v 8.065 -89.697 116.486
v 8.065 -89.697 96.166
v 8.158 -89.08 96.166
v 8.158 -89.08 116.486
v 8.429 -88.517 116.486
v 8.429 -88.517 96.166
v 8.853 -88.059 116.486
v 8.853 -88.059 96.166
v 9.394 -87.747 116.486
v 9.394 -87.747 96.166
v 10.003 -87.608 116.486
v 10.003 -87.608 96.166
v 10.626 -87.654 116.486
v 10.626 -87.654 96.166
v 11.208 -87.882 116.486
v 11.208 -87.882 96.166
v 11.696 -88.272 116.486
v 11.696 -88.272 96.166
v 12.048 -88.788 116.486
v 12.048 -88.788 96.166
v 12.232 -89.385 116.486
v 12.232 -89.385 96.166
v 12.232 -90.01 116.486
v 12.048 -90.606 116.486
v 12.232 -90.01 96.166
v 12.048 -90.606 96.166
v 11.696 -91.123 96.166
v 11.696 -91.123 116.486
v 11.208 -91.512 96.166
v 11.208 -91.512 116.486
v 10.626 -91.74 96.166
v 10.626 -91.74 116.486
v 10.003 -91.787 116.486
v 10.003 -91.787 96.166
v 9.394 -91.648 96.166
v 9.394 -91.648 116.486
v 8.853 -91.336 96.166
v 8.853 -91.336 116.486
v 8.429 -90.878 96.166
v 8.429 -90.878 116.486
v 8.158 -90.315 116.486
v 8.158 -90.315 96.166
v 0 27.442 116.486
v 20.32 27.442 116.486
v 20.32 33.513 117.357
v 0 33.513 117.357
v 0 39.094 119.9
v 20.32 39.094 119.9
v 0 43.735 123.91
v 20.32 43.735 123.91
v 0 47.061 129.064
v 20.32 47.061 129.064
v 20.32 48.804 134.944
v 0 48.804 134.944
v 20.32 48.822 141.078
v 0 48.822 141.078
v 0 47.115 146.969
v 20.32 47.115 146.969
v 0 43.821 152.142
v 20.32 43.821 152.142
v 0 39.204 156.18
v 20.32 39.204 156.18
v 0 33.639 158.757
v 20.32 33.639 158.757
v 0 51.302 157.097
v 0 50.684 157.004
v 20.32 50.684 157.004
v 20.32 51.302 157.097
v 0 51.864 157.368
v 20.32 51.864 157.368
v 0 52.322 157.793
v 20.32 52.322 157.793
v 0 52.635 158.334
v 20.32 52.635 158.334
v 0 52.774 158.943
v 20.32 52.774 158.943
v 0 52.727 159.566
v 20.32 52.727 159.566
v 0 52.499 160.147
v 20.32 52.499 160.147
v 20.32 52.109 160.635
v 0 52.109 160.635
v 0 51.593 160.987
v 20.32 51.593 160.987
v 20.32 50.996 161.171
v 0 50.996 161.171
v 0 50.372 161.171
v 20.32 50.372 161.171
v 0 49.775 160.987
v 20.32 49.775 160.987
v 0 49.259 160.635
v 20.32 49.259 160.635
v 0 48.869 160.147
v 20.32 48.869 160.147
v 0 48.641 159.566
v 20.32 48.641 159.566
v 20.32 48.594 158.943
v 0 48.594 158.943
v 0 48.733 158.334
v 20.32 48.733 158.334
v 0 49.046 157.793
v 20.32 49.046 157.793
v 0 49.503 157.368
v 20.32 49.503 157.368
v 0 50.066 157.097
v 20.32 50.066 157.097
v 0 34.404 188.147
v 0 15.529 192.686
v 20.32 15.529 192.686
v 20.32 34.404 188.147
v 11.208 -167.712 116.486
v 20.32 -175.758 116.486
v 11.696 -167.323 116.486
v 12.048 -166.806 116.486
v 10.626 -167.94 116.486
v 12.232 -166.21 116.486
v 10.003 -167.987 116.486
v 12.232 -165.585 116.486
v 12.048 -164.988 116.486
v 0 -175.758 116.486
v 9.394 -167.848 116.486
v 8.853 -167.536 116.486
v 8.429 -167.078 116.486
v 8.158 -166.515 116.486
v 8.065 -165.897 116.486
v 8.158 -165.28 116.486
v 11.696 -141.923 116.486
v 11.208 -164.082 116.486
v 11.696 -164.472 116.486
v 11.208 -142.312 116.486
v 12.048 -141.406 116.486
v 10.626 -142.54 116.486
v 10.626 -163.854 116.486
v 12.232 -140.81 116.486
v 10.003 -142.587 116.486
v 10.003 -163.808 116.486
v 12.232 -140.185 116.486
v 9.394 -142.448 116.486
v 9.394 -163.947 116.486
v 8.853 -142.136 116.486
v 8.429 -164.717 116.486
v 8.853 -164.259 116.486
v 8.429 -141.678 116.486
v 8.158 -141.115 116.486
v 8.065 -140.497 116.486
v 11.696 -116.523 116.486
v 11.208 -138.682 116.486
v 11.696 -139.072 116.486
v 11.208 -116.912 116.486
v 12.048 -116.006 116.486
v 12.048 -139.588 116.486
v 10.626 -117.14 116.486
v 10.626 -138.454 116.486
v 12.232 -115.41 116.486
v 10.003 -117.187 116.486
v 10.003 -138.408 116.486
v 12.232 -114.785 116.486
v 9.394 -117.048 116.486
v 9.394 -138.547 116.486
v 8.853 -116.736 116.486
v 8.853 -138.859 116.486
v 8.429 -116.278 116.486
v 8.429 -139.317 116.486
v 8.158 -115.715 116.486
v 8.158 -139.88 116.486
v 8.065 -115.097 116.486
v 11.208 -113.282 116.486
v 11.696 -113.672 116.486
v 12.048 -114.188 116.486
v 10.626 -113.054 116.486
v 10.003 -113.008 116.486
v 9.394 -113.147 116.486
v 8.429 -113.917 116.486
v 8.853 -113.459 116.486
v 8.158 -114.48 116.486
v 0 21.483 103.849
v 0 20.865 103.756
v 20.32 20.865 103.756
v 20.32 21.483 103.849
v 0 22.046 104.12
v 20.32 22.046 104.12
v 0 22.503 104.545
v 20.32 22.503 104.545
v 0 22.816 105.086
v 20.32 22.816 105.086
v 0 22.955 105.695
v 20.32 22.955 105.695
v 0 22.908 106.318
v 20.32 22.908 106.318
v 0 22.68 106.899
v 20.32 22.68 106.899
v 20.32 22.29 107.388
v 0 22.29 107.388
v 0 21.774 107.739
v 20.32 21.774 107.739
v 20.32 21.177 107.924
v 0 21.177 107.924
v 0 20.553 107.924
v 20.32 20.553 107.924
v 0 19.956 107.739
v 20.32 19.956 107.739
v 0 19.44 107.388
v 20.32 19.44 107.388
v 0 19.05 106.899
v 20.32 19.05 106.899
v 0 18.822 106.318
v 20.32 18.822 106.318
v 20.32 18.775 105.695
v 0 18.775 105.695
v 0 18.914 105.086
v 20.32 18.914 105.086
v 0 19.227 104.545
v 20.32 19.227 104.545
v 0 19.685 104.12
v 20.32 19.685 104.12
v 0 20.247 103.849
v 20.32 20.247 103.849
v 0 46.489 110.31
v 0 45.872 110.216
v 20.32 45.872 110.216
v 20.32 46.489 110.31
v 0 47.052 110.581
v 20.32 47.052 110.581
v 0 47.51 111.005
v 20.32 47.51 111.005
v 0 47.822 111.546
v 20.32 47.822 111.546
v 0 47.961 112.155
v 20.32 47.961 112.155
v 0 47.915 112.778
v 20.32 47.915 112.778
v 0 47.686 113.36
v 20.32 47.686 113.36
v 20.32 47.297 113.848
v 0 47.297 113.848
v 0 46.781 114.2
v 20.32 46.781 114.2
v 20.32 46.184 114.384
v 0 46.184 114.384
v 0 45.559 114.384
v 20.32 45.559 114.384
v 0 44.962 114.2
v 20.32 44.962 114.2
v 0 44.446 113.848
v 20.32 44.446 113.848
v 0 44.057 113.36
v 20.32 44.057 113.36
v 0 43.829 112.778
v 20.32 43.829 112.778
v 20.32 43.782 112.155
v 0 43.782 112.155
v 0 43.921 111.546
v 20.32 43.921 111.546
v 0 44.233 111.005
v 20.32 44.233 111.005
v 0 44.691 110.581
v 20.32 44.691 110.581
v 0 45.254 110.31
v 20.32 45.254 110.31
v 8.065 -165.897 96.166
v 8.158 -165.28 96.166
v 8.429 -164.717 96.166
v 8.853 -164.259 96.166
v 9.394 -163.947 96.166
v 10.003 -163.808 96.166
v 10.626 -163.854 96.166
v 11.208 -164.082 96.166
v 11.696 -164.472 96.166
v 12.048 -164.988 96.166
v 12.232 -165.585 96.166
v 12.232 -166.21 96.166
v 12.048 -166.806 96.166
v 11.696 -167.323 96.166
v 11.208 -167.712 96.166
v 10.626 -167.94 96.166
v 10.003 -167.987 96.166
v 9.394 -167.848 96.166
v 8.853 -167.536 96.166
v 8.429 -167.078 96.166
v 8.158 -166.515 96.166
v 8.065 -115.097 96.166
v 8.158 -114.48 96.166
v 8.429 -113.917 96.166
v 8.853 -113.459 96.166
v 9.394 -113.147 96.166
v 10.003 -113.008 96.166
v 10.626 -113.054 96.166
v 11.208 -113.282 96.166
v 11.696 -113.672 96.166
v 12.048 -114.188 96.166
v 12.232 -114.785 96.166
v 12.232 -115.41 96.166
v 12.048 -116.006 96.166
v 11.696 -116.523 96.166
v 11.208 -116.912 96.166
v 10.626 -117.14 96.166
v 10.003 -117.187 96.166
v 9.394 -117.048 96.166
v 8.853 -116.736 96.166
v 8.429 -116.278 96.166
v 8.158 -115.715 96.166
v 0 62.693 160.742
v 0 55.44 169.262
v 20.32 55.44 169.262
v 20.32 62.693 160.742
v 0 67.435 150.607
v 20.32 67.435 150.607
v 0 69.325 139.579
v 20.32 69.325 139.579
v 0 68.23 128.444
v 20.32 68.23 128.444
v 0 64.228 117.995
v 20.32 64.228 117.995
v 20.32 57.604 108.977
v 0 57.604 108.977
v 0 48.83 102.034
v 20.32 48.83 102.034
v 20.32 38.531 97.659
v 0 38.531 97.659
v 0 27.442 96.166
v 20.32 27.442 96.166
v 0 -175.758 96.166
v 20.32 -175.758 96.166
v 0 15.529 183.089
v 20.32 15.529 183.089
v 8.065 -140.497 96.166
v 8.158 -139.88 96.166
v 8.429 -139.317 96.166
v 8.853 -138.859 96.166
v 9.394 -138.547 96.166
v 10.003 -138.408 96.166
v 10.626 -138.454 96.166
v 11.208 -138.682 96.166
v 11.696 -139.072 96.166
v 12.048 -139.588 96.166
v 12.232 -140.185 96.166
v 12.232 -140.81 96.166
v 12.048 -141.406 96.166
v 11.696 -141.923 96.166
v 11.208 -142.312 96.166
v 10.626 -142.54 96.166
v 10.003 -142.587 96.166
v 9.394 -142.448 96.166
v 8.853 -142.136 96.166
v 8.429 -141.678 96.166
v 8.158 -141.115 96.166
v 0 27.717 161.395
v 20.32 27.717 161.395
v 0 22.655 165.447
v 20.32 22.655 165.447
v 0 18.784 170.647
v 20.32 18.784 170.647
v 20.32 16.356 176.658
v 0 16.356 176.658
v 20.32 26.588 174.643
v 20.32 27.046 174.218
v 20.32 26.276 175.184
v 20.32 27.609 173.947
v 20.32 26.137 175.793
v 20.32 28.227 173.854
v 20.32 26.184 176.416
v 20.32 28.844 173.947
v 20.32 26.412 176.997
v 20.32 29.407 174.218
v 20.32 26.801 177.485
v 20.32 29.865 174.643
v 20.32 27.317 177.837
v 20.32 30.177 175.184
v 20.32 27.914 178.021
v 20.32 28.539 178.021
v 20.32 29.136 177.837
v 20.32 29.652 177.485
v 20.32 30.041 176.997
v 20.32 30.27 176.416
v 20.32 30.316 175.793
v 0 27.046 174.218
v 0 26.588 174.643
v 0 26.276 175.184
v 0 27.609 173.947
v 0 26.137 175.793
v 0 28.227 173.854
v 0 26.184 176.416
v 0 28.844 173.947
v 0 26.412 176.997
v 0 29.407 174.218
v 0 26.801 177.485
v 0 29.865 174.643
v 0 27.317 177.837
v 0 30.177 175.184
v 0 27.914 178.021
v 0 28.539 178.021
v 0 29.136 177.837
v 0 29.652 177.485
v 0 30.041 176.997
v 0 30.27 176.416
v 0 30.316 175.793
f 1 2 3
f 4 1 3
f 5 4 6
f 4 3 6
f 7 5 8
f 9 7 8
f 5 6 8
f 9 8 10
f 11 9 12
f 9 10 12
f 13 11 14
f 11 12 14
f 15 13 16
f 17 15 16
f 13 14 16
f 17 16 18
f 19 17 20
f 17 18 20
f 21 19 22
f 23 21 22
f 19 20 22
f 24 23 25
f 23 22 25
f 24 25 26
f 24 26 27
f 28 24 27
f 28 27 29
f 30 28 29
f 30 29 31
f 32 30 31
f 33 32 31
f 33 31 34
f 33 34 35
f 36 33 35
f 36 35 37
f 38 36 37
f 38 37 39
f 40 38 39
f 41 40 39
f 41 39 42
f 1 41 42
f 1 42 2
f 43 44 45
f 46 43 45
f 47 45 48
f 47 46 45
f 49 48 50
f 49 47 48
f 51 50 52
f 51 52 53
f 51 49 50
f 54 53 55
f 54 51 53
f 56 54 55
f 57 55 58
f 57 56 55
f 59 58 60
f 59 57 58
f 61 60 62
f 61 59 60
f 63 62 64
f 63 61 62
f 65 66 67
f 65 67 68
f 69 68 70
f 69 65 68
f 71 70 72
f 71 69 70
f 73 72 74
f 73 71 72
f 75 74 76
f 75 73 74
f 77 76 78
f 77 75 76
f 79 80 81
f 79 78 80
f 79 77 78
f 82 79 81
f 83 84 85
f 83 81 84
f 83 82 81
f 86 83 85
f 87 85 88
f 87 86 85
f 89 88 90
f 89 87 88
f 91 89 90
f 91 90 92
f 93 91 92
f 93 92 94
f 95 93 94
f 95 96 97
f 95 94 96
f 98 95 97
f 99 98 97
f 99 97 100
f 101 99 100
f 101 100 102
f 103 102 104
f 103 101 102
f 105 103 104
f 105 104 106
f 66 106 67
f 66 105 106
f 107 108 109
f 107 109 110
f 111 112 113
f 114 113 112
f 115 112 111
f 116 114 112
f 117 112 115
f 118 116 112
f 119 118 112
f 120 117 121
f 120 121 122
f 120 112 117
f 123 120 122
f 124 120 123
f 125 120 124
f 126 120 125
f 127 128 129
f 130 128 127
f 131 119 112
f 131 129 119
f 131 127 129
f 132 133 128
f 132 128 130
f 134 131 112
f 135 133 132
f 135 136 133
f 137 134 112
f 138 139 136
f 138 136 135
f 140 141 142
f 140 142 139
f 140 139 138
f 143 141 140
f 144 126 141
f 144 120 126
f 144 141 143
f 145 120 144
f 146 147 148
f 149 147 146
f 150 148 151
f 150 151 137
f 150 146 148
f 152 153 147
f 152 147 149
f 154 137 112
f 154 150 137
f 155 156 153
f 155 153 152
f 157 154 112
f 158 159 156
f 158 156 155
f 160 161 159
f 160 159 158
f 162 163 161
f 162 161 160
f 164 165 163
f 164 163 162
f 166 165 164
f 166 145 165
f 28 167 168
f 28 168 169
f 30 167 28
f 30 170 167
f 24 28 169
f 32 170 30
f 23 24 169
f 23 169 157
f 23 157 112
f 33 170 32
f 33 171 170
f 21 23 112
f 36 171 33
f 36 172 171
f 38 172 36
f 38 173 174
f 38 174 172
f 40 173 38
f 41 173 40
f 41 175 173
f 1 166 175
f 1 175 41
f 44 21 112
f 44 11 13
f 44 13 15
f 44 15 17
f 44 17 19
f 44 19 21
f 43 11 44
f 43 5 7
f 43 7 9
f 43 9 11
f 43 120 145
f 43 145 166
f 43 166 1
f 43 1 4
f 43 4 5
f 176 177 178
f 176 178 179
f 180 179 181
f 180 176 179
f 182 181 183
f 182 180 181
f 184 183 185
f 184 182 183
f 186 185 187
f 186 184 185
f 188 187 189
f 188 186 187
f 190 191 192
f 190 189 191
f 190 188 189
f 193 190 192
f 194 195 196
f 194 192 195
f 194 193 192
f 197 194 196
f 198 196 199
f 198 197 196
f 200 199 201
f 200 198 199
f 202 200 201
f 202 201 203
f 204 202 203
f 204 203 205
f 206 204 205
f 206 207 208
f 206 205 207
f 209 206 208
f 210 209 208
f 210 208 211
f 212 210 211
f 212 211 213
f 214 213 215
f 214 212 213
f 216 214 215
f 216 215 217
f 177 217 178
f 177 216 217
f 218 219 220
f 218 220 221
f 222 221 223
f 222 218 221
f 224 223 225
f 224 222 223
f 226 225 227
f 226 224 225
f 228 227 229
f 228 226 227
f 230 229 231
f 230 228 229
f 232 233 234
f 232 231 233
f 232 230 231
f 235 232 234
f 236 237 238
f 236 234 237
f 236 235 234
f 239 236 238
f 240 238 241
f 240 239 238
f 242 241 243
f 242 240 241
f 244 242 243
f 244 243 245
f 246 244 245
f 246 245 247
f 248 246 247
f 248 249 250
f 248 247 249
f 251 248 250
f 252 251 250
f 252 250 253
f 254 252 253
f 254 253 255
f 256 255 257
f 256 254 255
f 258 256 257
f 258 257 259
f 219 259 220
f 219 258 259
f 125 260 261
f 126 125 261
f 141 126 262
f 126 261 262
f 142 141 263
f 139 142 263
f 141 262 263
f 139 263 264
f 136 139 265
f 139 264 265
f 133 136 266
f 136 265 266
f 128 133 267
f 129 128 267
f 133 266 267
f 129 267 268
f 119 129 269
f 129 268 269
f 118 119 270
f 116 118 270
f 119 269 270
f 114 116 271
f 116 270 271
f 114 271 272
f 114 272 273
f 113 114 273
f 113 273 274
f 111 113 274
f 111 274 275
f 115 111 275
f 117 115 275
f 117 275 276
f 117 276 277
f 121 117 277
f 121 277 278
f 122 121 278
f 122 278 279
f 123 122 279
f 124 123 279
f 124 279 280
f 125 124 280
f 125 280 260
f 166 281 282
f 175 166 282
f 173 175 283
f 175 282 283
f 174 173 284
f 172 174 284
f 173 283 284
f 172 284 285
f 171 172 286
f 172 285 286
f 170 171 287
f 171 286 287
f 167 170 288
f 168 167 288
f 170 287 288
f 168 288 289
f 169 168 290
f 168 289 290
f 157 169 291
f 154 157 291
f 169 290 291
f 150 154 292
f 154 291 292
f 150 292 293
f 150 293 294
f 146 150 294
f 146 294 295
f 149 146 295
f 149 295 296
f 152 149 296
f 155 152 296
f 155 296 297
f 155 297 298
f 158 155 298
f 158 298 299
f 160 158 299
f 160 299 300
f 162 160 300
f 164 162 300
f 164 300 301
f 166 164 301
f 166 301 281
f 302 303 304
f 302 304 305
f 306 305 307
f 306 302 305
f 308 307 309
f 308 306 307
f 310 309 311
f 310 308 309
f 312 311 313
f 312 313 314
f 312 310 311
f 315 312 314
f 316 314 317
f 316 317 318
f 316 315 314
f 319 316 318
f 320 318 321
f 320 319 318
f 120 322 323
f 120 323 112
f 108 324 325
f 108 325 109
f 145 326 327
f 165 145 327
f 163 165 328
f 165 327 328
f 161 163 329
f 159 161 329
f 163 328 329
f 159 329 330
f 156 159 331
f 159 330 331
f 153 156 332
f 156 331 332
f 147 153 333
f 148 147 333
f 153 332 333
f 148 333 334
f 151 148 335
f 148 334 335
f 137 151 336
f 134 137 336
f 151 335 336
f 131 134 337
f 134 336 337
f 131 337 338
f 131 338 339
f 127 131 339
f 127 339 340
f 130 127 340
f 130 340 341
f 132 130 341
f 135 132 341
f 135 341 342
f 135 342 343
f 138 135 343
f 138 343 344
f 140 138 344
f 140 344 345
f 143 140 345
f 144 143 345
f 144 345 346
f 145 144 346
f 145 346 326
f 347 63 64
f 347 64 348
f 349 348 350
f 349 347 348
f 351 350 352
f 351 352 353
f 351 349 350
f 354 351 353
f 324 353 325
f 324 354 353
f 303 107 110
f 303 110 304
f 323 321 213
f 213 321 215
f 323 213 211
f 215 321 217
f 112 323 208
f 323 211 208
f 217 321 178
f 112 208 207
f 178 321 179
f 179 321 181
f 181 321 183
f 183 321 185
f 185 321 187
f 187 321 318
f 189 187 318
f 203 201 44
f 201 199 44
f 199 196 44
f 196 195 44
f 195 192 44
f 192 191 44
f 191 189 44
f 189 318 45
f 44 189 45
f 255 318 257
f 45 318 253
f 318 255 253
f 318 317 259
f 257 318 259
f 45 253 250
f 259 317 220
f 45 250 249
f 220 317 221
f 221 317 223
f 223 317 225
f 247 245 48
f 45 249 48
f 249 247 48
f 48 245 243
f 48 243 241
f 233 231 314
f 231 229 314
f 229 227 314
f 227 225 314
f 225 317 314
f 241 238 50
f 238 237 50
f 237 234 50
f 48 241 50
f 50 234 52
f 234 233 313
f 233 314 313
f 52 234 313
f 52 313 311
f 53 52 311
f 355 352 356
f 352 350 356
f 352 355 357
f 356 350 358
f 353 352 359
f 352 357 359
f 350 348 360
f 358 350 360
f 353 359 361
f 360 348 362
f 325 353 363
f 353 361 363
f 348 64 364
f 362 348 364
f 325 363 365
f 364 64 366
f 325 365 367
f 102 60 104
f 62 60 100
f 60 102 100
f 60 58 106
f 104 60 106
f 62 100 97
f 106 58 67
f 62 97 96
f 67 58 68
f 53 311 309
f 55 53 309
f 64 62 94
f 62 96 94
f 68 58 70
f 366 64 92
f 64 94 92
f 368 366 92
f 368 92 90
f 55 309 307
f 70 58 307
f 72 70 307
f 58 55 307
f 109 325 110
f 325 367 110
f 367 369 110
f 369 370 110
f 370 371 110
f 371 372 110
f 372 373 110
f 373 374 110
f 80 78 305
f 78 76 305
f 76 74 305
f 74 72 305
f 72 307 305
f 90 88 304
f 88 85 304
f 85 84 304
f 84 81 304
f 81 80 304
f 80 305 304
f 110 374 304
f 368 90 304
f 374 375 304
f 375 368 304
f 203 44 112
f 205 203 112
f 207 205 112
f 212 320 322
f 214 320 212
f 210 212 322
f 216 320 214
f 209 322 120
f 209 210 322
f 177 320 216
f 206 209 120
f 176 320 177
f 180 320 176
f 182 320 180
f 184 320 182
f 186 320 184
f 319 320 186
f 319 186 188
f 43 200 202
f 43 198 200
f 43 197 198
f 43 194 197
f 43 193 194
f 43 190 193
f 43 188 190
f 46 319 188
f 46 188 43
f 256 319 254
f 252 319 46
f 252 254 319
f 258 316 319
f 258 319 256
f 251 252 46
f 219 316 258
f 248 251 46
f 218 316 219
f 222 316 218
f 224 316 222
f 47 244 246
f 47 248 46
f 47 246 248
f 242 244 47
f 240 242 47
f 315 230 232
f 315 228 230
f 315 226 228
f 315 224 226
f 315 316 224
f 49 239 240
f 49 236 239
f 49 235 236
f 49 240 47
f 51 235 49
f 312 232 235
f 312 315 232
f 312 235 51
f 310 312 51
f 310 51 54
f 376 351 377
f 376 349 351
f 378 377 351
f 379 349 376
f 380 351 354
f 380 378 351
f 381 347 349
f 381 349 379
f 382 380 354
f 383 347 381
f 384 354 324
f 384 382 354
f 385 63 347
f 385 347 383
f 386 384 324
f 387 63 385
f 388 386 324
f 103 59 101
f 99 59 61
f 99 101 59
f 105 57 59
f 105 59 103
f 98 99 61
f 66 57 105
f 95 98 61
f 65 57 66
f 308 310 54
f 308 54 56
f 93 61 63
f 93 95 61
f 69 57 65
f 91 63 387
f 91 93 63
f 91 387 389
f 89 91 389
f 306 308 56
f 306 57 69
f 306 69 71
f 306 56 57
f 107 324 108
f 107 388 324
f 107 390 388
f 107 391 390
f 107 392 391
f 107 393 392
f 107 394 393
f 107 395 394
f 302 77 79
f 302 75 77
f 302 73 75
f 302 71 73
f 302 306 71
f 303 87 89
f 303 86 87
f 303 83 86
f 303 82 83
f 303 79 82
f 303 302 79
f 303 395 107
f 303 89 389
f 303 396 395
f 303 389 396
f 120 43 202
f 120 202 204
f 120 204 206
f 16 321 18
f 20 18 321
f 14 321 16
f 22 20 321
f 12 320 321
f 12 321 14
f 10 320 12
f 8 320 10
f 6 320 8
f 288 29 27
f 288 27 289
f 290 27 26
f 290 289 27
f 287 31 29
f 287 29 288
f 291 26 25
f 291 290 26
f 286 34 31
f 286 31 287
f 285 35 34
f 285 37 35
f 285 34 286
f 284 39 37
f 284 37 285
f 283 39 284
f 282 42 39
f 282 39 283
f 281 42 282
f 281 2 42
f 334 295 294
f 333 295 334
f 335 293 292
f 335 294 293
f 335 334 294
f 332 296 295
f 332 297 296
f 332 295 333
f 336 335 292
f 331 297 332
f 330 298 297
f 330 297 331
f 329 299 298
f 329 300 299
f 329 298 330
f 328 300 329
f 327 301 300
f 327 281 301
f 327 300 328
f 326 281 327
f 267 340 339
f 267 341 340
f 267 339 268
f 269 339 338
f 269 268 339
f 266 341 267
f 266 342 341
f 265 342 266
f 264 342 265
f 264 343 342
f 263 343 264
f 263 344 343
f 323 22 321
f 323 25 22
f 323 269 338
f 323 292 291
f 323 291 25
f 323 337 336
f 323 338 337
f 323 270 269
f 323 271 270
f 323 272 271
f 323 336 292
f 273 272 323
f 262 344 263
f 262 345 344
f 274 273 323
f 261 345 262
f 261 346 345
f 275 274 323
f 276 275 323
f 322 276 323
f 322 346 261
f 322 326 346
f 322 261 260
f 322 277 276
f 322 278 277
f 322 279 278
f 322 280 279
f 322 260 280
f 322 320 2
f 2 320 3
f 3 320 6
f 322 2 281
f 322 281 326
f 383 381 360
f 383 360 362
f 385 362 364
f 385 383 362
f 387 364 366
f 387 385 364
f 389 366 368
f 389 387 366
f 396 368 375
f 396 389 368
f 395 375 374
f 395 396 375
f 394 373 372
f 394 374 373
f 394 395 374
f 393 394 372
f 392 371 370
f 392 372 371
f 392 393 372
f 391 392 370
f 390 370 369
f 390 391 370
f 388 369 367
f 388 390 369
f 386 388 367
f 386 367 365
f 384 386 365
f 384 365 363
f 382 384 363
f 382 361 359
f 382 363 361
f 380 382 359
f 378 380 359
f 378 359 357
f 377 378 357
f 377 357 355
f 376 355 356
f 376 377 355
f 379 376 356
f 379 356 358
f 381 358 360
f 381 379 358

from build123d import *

# Parameters (mm, degrees)
BOSS_EXTRUDE1_DEPTH        = 20.32
F_8_0_199_DIAMETER_HOLE1_D = 4.191
CUT_EXTRUDE1_DEPTH         = 262.594137913
CUT_EXTRUDE1_DEPTH_BACK    = 262.594137913
SKETCH4_R                  = 2.0955


with BuildPart() as part:
    # Sketch1 → Boss-Extrude1 (new body)
    with BuildSketch(Plane(origin=(0, 0, 0), x_dir=(0, 0, -1), z_dir=(1, 0, 0))):
        with BuildLine():
            Line((-96.165603327, -175.75792688), (-116.485603327, -175.75792688))
            Line((-116.485603327, -175.75792688), (-116.485603327, 27.44207312))
            ThreePointArc((-116.485603327, 27.44207312), (-134.944175413, 48.803773877), (-158.757234566, 33.6387036))
            ThreePointArc((-158.757234566, 33.6387036), (-167.922977729, 20.553260194), (-183.088565435, 15.528857106))
            Line((-183.088565435, 15.528857106), (-192.685603327, 15.528857106))
            Line((-192.685603327, 15.528857106), (-188.14698461, 34.403768669))
            Line((-188.14698461, 34.403768669), (-169.26182214, 55.43971331))
            ThreePointArc((-169.26182214, 55.43971331), (-123.085045139, 66.579411625), (-96.165603327, 27.44207312))
            Line((-96.165603327, 27.44207312), (-96.165603327, -175.75792688))
        make_face()
    extrude(amount=BOSS_EXTRUDE1_DEPTH)

    # #8 (0.199) Diameter Hole1 (through all)
    with Locations(Plane.XY.offset(116.485603327)):
        with Locations((10.16, -89.697235998), (10.16, -115.097235998), (10.16, -140.497235998), (10.16, -165.897235998), (10.16, -191.297235998)):
            Hole(F_8_0_199_DIAMETER_HOLE1_D / 2)

    # Sketch4 → Cut-Extrude1 (cut, two sides: drawn at the far end of the back side and taken through both)
    with BuildSketch(Plane(origin=(20.32, 0, 0), x_dir=(0, 0, -1), z_dir=(1, 0, 0)).offset(-CUT_EXTRUDE1_DEPTH_BACK)):
        with Locations((-175.949281774, 28.226562255)):
            Circle(SKETCH4_R)
        with Locations((-159.099223615, 50.683912634)):
            Circle(SKETCH4_R)
        with Locations((-112.3119526, 45.871678806)):
            Circle(SKETCH4_R)
        with Locations((-105.851443143, 20.865071419)):
            Circle(SKETCH4_R)
    extrude(amount=CUT_EXTRUDE1_DEPTH + CUT_EXTRUDE1_DEPTH_BACK, mode=Mode.SUBTRACT)


solid = part.part
